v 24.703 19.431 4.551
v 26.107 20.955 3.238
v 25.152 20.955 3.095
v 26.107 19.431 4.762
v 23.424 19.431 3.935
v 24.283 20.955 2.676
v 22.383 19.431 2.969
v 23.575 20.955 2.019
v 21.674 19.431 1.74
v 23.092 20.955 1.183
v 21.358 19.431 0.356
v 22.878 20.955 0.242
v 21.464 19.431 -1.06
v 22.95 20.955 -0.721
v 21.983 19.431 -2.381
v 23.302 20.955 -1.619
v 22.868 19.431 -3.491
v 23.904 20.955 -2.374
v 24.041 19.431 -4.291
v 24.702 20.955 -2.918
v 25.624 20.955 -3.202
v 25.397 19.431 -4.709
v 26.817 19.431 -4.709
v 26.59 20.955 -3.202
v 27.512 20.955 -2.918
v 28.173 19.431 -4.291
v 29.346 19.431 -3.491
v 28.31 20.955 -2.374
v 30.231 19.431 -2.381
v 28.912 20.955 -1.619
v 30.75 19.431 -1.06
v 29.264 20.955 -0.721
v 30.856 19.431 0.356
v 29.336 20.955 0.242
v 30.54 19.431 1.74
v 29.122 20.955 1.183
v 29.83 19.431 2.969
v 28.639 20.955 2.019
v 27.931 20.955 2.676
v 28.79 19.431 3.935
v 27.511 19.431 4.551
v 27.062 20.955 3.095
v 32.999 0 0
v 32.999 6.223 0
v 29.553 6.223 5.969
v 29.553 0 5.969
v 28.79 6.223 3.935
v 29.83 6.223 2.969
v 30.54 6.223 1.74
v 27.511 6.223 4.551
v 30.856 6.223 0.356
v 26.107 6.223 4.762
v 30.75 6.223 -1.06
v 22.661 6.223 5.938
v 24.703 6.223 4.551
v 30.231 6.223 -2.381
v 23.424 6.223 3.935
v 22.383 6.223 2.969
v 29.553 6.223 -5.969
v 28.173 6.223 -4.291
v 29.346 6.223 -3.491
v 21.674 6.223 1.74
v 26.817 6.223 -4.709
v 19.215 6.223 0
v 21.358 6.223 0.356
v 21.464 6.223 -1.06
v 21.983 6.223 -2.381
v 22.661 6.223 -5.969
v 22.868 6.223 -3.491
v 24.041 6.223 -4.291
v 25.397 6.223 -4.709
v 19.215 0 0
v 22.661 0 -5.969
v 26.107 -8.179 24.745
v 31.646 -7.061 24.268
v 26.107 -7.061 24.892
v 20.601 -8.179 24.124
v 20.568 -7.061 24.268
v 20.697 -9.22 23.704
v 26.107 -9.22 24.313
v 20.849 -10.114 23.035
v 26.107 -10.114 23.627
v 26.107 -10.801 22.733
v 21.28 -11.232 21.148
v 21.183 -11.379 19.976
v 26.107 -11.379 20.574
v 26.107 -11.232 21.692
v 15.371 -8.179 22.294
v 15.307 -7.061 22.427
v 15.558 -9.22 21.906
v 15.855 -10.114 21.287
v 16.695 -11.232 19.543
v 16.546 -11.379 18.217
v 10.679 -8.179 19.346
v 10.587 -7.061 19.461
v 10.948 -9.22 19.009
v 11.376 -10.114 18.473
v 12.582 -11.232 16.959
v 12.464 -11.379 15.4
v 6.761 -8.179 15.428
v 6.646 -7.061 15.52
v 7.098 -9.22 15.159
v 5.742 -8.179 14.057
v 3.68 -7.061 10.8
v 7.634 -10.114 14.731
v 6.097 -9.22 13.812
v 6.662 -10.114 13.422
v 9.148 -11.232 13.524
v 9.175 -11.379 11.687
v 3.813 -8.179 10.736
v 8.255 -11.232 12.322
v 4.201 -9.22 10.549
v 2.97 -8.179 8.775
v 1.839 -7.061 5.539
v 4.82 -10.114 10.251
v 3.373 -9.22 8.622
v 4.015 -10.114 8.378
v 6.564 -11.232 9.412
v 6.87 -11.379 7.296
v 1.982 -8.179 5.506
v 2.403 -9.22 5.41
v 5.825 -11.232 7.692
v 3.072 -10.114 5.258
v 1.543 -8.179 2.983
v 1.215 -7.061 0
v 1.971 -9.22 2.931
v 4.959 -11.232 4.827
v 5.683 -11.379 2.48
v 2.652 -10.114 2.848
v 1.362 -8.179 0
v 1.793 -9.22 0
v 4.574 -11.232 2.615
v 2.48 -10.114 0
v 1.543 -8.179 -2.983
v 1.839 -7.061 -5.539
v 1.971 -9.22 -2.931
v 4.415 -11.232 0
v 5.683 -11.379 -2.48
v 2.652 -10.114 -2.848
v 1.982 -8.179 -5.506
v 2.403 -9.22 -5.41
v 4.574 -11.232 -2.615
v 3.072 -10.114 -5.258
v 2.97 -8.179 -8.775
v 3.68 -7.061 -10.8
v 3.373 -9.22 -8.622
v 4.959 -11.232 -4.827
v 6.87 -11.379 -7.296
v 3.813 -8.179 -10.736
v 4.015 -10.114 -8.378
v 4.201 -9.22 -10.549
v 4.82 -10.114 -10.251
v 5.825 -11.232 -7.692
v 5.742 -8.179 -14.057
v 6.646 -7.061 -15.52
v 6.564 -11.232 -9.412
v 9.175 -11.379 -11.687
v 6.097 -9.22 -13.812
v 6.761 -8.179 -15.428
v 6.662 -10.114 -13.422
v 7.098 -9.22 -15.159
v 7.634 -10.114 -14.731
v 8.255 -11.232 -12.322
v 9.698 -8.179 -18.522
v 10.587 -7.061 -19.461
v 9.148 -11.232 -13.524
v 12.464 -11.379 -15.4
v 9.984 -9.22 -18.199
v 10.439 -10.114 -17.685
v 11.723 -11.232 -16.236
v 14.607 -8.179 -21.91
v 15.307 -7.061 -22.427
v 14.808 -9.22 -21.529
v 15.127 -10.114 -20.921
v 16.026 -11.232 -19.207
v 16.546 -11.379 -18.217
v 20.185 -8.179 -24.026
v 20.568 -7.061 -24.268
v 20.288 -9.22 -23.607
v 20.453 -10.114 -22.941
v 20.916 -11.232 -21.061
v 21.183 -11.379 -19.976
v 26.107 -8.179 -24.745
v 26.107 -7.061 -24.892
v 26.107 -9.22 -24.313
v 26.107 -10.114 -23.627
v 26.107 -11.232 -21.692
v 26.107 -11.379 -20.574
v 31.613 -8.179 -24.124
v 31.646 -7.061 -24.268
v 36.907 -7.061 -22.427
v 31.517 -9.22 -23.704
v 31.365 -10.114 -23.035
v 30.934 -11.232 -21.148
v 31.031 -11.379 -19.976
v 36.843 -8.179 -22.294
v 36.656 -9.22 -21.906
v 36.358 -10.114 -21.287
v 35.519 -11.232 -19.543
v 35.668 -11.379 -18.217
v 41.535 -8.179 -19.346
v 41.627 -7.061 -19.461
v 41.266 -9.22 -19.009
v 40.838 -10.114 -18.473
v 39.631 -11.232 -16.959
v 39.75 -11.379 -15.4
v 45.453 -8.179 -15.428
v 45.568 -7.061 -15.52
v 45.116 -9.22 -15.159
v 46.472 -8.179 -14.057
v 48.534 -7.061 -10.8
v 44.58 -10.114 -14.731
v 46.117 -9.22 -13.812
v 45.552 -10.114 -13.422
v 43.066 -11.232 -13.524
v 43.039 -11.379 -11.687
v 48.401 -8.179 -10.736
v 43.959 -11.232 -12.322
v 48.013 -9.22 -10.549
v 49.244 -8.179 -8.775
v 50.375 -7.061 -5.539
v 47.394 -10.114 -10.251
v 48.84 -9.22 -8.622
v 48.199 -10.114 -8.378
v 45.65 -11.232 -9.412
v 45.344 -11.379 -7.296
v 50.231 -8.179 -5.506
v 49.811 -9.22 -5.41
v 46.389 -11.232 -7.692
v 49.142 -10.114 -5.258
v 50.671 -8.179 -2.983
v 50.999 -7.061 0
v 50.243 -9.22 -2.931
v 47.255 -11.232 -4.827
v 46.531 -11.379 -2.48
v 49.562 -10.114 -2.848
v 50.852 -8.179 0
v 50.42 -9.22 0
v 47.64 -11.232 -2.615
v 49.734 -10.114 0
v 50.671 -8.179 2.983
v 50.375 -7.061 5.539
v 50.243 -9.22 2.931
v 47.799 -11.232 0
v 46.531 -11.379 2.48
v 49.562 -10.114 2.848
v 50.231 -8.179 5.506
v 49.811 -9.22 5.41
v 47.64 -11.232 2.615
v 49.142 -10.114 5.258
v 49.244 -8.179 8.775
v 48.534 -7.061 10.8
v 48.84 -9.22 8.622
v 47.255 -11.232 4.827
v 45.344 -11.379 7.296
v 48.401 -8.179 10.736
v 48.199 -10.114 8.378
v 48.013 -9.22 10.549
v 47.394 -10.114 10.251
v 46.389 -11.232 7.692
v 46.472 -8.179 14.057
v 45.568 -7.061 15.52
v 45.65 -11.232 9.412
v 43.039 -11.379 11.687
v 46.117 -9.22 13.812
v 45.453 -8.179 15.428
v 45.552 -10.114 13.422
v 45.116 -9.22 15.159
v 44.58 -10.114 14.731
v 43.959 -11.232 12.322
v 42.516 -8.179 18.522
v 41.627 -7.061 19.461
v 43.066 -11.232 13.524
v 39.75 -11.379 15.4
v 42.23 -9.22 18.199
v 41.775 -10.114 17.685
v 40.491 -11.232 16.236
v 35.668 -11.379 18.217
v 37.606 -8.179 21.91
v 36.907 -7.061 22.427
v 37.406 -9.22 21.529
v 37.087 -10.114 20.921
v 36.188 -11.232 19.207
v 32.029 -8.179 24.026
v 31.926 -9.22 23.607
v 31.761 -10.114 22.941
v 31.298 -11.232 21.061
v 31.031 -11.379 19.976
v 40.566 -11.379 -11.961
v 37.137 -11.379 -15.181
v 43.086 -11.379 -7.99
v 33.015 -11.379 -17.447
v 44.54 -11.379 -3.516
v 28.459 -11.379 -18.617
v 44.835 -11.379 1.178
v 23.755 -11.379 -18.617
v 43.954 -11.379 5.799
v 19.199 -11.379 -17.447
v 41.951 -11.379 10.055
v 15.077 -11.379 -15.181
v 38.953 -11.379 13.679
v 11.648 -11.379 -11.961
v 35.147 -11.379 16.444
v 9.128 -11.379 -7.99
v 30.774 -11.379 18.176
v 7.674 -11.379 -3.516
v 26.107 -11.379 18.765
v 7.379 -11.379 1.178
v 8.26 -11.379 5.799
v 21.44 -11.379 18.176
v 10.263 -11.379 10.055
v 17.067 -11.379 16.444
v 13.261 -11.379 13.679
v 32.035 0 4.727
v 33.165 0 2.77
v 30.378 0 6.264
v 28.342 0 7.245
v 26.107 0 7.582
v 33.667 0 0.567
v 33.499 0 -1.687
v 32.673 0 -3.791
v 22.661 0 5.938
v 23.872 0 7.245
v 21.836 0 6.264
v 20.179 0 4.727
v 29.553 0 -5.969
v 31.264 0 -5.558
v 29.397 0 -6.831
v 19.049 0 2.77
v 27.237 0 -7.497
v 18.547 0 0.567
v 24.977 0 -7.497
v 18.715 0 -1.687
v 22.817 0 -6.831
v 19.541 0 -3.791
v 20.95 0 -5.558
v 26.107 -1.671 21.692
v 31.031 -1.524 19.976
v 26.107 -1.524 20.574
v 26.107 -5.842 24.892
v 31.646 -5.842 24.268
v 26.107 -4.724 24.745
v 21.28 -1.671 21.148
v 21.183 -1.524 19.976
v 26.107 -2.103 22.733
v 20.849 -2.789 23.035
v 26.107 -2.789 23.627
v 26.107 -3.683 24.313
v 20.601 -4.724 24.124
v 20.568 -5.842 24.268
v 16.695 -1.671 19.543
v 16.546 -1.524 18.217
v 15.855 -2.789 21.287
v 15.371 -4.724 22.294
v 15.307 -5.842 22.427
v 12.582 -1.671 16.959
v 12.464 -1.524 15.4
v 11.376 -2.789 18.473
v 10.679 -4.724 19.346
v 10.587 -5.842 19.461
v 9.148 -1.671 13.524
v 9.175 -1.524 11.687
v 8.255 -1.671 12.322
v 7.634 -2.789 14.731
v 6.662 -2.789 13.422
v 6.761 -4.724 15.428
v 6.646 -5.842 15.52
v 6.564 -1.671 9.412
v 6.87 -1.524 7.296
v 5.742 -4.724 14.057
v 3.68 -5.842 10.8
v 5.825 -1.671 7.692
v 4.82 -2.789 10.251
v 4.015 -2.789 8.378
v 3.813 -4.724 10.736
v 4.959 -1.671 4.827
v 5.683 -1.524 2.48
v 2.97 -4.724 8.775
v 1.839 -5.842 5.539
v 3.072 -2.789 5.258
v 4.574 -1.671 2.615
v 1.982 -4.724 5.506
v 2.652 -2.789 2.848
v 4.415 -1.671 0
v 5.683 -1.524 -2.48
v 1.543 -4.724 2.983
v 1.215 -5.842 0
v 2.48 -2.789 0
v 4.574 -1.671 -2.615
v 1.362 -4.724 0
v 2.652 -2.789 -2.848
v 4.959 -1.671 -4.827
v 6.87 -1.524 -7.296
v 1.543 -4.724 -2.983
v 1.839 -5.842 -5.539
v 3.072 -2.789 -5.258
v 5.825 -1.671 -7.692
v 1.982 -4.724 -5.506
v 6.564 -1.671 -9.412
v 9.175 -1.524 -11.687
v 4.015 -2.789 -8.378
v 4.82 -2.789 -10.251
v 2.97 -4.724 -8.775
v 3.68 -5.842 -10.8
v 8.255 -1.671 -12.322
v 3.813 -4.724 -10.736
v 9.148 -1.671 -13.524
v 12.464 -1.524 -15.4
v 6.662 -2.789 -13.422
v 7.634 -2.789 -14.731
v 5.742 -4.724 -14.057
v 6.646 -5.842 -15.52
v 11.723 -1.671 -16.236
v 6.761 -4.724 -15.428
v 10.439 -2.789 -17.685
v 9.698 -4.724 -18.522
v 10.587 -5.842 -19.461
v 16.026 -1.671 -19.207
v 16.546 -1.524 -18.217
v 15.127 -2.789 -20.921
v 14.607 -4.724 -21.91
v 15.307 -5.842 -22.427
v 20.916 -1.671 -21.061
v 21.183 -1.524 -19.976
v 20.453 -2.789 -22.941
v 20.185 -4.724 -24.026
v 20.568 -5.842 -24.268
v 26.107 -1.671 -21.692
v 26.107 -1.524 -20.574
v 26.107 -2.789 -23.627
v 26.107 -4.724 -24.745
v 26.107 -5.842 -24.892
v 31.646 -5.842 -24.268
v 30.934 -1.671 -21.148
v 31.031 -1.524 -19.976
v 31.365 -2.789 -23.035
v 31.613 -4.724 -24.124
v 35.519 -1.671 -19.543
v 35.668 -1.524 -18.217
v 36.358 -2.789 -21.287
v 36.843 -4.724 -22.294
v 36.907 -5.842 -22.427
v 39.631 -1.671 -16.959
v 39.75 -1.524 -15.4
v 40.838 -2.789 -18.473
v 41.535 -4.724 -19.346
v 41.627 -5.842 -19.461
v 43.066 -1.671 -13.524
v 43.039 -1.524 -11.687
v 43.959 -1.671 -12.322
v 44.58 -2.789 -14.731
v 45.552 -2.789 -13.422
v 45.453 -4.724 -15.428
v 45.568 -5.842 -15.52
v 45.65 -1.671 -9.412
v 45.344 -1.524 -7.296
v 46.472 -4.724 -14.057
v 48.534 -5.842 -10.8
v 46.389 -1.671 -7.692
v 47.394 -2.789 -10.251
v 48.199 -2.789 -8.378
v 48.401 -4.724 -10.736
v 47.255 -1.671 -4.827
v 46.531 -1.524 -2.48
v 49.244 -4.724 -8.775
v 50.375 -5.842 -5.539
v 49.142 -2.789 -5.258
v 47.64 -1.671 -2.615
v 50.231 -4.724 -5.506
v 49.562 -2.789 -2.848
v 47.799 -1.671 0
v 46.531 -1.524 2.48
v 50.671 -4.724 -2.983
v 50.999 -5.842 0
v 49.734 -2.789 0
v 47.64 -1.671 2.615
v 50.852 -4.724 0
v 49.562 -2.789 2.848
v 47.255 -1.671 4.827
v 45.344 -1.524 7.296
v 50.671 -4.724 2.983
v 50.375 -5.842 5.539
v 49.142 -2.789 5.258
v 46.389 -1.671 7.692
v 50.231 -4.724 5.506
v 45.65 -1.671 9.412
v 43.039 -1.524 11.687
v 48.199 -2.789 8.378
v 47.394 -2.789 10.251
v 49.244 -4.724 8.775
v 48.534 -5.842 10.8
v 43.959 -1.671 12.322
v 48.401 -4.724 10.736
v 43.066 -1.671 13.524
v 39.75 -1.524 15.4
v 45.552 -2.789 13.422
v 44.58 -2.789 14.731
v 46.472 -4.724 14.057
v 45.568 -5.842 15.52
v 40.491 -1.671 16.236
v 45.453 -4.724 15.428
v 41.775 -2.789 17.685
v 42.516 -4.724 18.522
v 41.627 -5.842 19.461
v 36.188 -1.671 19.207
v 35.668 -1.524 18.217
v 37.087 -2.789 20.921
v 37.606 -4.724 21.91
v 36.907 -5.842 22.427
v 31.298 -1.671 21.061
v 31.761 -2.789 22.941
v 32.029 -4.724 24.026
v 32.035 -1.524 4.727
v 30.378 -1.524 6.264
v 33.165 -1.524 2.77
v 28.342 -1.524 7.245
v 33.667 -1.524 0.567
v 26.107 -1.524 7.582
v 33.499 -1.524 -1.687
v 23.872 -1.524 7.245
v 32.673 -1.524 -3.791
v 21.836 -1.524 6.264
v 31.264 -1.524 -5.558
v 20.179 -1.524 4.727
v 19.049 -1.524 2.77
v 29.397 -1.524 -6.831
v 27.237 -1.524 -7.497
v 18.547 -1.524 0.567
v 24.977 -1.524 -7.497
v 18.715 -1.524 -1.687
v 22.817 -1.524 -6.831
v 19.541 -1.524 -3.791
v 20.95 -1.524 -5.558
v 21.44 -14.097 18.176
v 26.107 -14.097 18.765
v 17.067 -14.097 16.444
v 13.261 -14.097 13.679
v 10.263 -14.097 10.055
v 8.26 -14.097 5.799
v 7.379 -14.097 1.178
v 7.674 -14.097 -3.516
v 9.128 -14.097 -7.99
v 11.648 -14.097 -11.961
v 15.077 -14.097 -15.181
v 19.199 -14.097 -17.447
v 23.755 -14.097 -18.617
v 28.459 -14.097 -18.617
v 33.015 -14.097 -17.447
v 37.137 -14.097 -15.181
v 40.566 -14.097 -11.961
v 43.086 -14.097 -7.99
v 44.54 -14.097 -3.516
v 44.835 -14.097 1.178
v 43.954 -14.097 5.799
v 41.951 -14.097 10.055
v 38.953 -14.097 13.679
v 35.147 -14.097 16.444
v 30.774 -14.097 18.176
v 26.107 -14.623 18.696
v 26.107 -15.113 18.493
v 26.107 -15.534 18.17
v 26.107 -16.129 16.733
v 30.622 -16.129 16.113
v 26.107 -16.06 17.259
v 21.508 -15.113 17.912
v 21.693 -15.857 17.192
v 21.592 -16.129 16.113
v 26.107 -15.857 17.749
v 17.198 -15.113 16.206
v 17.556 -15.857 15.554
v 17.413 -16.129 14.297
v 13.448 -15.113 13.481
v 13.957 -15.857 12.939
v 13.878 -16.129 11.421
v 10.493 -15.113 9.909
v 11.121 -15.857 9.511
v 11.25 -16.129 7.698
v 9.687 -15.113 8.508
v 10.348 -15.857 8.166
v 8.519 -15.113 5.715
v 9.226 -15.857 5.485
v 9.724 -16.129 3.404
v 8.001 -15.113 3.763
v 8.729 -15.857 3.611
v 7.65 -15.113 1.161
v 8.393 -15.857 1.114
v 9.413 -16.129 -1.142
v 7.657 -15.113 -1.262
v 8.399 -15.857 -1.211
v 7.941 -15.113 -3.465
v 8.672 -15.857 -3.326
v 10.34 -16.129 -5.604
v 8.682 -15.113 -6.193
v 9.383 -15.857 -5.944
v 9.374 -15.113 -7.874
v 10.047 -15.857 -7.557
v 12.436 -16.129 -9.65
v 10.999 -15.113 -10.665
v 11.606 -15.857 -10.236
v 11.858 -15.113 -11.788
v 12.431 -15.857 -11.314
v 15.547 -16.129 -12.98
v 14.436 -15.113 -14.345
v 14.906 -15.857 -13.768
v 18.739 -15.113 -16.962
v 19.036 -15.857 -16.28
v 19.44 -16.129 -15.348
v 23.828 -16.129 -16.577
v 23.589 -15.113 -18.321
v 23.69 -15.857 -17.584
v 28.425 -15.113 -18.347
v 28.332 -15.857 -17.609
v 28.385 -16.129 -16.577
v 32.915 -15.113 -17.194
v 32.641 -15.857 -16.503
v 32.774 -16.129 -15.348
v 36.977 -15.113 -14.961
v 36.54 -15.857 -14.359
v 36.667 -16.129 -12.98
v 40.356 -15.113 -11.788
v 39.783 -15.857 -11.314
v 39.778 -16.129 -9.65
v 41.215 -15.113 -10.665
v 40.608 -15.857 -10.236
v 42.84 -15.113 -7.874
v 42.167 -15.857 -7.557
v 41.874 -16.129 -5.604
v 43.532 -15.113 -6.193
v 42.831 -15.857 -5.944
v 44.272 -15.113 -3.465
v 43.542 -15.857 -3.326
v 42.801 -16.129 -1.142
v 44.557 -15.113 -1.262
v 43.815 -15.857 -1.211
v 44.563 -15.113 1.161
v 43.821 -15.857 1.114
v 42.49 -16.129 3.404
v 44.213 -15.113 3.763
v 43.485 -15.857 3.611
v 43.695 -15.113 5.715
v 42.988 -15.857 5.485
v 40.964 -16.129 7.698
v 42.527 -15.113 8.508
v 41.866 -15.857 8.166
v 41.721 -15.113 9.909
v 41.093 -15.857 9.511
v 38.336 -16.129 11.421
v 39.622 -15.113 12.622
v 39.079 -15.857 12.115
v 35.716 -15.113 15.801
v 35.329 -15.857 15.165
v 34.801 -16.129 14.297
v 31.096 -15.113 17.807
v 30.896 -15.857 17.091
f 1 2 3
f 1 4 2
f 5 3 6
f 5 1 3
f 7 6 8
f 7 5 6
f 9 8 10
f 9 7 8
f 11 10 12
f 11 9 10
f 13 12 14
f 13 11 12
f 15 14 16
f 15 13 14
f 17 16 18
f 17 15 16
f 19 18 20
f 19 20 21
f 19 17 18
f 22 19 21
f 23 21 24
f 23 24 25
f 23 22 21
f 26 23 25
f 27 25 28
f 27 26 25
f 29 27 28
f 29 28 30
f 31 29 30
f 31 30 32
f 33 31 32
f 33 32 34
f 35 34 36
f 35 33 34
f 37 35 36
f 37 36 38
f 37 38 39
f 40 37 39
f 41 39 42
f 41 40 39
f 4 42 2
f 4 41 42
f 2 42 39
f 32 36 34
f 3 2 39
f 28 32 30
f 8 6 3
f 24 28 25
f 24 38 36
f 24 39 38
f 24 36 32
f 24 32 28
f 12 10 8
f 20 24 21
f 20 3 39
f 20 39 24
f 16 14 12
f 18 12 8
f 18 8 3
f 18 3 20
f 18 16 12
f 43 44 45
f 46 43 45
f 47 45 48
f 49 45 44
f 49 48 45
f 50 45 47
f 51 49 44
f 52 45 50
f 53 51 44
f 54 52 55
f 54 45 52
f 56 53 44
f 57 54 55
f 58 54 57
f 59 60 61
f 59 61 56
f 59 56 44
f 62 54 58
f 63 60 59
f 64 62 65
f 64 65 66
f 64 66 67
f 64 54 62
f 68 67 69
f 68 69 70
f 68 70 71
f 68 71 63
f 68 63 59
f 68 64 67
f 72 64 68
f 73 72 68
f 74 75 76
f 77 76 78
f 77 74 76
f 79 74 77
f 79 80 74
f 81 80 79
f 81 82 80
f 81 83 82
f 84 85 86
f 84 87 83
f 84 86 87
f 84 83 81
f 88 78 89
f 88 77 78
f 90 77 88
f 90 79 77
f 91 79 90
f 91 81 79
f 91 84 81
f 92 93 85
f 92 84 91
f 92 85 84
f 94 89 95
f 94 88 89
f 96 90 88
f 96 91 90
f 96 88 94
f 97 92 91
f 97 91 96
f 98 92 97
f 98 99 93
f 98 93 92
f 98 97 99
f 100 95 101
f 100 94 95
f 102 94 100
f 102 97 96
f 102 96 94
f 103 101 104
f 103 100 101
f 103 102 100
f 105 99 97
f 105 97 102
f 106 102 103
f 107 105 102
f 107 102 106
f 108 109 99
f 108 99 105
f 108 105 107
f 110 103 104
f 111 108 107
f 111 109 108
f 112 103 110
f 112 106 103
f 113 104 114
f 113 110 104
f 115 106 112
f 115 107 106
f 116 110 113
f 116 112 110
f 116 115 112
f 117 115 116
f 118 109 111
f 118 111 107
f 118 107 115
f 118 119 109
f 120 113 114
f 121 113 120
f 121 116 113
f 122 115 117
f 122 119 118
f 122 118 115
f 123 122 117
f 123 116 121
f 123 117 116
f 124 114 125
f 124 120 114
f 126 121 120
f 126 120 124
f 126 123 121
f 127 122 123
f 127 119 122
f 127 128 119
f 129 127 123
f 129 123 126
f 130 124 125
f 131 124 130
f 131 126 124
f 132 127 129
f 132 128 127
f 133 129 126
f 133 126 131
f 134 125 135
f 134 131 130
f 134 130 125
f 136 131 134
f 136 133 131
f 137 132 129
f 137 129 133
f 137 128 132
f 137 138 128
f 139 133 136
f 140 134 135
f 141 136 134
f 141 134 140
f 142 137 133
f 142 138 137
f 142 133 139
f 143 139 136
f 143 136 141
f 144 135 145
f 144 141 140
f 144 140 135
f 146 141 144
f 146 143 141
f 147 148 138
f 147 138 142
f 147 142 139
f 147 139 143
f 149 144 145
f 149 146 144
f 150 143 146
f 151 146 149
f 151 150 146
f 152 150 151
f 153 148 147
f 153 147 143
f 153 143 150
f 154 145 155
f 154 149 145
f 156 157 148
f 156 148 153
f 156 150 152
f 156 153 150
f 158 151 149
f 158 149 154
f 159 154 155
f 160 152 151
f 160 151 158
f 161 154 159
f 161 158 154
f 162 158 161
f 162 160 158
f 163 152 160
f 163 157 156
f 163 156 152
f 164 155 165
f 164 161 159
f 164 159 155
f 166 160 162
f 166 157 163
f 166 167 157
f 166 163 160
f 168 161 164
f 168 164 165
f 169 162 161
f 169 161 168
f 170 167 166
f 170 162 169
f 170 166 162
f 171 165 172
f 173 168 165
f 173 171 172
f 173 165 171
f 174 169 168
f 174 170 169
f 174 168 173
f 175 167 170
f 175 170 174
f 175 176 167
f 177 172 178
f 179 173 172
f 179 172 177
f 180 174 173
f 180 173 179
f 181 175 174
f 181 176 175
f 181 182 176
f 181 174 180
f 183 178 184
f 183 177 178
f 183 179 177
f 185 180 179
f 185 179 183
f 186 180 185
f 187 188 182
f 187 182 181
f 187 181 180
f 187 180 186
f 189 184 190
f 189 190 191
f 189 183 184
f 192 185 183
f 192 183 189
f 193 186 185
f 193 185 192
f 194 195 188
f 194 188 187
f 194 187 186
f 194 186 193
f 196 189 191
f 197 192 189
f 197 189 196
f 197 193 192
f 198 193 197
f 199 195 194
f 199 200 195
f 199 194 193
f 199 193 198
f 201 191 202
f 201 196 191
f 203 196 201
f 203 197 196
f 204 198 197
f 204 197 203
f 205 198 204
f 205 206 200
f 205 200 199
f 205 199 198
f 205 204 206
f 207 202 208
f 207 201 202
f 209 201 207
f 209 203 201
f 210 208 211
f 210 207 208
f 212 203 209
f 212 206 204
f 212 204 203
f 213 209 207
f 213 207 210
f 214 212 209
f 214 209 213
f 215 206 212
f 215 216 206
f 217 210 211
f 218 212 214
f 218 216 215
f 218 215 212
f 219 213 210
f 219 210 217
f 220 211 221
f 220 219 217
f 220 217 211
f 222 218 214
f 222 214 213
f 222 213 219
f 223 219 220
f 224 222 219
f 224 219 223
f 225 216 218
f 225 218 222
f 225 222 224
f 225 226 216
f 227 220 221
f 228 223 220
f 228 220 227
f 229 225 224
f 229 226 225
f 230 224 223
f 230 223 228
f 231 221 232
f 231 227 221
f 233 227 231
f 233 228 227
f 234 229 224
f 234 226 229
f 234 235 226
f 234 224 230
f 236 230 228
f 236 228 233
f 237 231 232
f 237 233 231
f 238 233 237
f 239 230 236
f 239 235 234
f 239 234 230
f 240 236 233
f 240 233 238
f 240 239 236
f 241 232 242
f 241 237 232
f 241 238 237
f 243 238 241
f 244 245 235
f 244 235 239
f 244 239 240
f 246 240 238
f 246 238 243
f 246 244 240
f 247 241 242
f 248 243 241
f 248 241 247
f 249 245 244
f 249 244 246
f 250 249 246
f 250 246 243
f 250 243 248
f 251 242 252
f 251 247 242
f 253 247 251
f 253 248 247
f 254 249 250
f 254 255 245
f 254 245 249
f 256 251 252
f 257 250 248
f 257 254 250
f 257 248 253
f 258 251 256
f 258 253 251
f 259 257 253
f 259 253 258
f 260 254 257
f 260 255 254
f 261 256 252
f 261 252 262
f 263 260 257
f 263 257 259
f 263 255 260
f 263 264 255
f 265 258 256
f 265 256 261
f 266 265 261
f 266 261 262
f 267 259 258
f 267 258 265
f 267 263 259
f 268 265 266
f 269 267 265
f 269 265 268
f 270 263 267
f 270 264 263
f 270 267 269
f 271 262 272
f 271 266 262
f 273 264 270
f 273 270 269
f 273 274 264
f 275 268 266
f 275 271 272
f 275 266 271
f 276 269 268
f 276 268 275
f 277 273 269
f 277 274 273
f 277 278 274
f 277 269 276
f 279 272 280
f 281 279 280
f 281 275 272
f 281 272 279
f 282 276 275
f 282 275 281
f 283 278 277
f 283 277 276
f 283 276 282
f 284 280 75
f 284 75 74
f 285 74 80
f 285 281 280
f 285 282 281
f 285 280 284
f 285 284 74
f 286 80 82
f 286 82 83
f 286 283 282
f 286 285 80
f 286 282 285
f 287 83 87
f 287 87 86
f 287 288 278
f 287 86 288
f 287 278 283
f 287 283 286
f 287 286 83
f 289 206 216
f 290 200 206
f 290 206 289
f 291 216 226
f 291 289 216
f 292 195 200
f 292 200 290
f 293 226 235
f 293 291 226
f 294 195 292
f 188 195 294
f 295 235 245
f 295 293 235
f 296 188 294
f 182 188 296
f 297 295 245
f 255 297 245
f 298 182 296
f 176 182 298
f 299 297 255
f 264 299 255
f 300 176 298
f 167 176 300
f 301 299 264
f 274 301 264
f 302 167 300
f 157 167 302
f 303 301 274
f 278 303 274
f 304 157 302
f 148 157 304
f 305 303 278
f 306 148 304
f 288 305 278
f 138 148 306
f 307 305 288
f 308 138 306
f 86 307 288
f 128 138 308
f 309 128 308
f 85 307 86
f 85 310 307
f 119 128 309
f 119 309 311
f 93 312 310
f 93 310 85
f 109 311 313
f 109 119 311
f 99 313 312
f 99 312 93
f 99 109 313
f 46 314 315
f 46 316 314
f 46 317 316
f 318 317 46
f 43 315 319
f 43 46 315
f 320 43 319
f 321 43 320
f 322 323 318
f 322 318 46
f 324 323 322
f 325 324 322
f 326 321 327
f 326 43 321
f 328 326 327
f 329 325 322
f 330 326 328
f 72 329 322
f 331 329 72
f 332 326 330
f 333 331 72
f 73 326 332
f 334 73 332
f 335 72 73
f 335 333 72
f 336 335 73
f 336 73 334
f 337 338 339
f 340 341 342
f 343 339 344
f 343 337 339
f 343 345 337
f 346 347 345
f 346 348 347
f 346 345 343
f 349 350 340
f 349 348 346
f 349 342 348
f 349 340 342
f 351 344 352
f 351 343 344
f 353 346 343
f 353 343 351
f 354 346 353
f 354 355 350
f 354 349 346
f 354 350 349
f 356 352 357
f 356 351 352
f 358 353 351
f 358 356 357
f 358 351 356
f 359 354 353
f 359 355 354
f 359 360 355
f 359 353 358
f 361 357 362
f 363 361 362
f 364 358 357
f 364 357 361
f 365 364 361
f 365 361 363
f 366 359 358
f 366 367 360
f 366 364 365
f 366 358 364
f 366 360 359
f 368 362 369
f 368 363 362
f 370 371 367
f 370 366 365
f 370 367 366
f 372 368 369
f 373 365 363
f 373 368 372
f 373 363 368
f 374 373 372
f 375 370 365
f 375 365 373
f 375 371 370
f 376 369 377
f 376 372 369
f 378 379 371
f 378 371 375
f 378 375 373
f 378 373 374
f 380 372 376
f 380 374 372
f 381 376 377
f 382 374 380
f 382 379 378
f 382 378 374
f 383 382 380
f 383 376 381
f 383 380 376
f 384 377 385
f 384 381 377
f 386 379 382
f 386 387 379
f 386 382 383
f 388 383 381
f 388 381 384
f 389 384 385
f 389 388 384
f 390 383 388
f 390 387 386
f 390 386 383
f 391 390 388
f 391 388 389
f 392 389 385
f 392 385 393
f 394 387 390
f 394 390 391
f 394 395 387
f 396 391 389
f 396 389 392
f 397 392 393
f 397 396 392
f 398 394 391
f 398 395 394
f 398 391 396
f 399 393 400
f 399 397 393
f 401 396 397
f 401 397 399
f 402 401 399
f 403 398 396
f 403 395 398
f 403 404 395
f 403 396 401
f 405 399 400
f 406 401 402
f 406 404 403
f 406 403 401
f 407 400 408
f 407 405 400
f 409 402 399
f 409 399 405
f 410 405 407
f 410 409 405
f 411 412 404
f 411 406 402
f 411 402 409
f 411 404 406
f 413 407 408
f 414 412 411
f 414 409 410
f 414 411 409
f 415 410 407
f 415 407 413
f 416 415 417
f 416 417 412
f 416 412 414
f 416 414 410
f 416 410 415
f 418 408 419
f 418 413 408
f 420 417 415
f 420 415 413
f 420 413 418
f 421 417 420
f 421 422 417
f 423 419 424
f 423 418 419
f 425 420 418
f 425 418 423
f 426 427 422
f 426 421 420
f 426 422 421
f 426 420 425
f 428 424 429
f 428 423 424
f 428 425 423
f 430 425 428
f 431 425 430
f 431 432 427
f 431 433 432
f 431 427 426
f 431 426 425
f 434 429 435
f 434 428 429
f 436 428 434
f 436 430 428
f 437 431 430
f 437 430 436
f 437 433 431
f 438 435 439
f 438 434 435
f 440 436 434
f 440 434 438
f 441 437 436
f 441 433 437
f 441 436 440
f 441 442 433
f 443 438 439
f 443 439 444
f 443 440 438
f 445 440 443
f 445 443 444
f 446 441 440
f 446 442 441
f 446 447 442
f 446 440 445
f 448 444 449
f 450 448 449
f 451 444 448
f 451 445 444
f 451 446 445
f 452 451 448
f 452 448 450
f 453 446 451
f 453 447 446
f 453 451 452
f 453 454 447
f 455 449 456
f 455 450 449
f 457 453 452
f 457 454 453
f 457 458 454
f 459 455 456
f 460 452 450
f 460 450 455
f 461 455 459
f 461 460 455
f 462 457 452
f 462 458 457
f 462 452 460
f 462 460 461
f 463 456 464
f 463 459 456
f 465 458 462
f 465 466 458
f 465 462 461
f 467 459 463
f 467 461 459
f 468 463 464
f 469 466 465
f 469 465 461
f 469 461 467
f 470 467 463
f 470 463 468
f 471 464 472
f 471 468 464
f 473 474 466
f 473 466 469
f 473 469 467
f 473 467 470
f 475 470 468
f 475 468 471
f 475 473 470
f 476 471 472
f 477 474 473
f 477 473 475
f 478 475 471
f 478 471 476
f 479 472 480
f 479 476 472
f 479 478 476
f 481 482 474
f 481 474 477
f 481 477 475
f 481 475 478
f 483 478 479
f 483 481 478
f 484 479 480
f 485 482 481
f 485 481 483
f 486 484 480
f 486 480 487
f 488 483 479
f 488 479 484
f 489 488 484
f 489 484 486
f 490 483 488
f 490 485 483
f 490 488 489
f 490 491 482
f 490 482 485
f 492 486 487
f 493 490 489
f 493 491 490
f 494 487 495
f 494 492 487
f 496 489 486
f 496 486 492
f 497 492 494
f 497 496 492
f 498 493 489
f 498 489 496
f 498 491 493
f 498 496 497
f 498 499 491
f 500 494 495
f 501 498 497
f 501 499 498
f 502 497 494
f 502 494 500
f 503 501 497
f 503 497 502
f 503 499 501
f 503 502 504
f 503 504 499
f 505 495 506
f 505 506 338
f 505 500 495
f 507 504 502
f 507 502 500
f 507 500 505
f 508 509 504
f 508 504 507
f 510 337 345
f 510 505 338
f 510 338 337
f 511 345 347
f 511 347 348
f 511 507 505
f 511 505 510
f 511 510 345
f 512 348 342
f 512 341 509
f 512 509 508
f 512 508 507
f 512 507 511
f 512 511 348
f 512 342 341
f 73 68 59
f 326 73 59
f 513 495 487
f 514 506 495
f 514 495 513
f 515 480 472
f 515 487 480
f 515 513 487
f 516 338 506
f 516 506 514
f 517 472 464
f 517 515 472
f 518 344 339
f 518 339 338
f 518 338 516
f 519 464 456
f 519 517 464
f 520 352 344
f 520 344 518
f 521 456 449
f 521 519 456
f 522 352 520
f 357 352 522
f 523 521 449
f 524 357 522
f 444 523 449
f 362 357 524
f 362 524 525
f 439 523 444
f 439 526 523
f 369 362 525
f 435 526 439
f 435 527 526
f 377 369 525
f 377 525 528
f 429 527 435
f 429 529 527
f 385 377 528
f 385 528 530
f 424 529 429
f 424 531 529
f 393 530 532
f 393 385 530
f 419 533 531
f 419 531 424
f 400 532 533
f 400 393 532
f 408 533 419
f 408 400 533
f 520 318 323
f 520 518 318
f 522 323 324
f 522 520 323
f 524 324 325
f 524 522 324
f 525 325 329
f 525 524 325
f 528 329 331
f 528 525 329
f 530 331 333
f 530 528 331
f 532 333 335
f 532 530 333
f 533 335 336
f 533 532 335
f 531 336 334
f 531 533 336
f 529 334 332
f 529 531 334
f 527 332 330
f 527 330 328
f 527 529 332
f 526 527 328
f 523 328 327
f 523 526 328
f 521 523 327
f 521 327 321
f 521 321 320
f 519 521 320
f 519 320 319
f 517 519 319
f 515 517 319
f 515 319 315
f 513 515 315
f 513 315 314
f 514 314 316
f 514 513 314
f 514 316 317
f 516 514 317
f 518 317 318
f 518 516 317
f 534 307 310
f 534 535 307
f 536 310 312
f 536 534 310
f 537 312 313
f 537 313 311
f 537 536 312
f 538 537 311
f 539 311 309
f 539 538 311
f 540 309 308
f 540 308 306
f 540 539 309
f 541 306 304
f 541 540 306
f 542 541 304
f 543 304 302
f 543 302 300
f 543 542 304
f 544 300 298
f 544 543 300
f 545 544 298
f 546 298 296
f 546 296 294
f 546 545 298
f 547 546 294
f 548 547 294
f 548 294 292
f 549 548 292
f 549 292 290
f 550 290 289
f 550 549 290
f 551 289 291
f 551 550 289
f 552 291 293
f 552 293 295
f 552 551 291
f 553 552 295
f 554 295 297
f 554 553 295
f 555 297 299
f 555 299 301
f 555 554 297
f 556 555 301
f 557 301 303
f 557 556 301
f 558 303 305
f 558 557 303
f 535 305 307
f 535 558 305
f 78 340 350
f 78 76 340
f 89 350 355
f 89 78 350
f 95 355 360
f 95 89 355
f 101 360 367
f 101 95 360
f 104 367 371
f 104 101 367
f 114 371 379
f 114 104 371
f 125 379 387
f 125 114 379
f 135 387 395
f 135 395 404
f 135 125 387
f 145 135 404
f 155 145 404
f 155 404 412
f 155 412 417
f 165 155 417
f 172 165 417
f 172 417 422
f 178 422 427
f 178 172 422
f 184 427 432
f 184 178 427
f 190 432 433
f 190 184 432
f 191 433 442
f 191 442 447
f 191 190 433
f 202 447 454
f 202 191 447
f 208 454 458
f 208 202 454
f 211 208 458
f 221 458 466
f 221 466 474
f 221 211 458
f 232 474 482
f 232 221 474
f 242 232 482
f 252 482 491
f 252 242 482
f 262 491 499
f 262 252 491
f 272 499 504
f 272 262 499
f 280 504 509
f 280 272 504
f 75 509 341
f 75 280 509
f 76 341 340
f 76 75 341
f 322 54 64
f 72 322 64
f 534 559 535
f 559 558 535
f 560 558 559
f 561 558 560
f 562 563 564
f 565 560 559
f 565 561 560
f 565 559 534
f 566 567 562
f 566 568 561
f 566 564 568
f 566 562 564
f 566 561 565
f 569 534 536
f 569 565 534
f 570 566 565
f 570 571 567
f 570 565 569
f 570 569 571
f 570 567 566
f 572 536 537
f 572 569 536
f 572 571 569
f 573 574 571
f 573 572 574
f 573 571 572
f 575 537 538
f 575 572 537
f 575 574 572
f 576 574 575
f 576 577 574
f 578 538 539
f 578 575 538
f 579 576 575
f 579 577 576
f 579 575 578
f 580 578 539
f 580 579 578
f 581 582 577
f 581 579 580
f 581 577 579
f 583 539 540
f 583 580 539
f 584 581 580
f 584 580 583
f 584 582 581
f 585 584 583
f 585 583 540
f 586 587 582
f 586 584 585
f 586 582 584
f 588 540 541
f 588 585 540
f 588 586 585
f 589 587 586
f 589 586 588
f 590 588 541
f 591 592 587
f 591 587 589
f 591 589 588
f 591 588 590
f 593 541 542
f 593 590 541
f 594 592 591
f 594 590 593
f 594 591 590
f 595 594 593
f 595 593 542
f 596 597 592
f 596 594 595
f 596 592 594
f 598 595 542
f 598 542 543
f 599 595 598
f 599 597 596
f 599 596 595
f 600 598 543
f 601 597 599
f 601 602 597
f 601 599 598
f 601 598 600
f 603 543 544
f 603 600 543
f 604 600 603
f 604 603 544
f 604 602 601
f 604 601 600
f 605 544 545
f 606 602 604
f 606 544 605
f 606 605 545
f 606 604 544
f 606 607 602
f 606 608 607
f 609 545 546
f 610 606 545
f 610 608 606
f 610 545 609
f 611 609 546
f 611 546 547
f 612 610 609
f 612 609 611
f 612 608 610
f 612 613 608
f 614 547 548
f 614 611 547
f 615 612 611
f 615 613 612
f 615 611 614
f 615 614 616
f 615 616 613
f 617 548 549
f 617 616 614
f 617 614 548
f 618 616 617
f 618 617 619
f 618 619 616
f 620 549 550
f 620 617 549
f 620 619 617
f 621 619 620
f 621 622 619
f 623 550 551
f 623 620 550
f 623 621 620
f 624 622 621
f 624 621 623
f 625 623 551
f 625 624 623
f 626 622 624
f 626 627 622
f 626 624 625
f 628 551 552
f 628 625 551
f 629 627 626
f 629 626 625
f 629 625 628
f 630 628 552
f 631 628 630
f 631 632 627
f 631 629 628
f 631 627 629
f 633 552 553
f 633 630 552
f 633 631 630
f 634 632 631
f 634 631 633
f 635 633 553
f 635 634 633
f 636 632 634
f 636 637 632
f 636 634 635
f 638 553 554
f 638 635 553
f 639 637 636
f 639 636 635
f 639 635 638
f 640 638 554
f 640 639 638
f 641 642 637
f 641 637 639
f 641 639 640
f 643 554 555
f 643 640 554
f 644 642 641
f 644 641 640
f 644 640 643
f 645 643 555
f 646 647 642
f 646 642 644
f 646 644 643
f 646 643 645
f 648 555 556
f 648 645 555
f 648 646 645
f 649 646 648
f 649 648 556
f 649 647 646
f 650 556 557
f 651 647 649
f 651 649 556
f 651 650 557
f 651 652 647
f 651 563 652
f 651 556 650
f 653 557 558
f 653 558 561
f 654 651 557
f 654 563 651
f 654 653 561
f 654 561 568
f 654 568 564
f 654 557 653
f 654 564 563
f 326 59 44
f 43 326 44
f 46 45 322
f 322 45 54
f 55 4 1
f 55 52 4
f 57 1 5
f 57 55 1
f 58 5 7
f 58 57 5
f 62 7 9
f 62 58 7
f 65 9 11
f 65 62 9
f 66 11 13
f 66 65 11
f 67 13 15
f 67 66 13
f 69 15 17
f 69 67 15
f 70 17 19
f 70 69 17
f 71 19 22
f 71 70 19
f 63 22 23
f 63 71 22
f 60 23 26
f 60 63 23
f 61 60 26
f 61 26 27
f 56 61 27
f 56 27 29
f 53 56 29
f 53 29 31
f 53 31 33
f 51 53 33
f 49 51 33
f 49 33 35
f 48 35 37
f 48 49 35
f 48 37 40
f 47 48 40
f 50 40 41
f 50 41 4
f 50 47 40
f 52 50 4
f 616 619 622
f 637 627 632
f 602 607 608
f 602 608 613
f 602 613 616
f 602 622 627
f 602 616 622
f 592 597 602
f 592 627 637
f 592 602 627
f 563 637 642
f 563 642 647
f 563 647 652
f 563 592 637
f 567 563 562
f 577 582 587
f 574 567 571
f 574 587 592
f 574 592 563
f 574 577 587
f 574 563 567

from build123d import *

# Parameters (mm, degrees)
SKETCH2_OUTSIDE_W  = 67.698
SKETCH2_OUTSIDE_H  = 67.698
CUT_EXTRUDE1_DEPTH = 6.223


with BuildPart() as part:
    # Sketch1 → Revolve1 (revolve)
    with BuildSketch(Plane.XY, mode=Mode.PRIVATE) as revolve1_sk:
        with BuildLine():
            Line((9.373695388, -16.129), (26.106953114, -16.129))
            Line((26.106953114, -16.129), (26.106953114, 20.955))
            Line((26.106953114, 20.955), (22.868453114, 20.955))
            Line((22.868453114, 20.955), (21.344453114, 19.431))
            Line((21.344453114, 19.431), (21.344453114, 6.223))
            Line((21.344453114, 6.223), (19.214545601, 6.223))
            Line((19.214545601, 6.223), (19.214545601, 0))
            Line((19.214545601, 0), (18.525304849, 0))
            Line((18.525304849, 0), (18.525304849, -1.524))
            Line((18.525304849, -1.524), (5.532953114, -1.524))
            ThreePointArc((5.532953114, -1.524), (2.479666033, -2.788712919), (1.214953114, -5.842))
            Line((1.214953114, -5.842), (1.214953114, -7.0612))
            ThreePointArc((1.214953114, -7.0612), (2.479666033, -10.114487081), (5.532953114, -11.3792))
            Line((5.532953114, -11.3792), (7.341695388, -11.3792))
            Line((7.341695388, -11.3792), (7.341695388, -14.097))
            ThreePointArc((7.341695388, -14.097), (7.936854408, -15.533840979), (9.373695388, -16.129))
        make_face()
    revolve(revolve1_sk.sketch.rotate(Axis((26.106953114, 20.955, 0), (0, -1, 0)), 270), axis=Axis((26.106953114, 20.955, 0), (0, -1, 0)))

    # Sketch2 outside → Cut-Extrude1 (cut)
    with BuildSketch(Plane(origin=(0, 6.223, 0), x_dir=(1, 0, 0), z_dir=(0, 1, 0))):
        with Locations((26.107, 0)):
            Rectangle(SKETCH2_OUTSIDE_W, SKETCH2_OUTSIDE_H)
        Polygon((22.660749357, 5.969), (29.553156871, 5.969), (32.999360628, 0), (29.553156871, -5.969), (22.660749357, -5.938392769), (19.214545601, 0), align=None, mode=Mode.SUBTRACT)
    extrude(amount=-CUT_EXTRUDE1_DEPTH, mode=Mode.SUBTRACT)


solid = part.part
